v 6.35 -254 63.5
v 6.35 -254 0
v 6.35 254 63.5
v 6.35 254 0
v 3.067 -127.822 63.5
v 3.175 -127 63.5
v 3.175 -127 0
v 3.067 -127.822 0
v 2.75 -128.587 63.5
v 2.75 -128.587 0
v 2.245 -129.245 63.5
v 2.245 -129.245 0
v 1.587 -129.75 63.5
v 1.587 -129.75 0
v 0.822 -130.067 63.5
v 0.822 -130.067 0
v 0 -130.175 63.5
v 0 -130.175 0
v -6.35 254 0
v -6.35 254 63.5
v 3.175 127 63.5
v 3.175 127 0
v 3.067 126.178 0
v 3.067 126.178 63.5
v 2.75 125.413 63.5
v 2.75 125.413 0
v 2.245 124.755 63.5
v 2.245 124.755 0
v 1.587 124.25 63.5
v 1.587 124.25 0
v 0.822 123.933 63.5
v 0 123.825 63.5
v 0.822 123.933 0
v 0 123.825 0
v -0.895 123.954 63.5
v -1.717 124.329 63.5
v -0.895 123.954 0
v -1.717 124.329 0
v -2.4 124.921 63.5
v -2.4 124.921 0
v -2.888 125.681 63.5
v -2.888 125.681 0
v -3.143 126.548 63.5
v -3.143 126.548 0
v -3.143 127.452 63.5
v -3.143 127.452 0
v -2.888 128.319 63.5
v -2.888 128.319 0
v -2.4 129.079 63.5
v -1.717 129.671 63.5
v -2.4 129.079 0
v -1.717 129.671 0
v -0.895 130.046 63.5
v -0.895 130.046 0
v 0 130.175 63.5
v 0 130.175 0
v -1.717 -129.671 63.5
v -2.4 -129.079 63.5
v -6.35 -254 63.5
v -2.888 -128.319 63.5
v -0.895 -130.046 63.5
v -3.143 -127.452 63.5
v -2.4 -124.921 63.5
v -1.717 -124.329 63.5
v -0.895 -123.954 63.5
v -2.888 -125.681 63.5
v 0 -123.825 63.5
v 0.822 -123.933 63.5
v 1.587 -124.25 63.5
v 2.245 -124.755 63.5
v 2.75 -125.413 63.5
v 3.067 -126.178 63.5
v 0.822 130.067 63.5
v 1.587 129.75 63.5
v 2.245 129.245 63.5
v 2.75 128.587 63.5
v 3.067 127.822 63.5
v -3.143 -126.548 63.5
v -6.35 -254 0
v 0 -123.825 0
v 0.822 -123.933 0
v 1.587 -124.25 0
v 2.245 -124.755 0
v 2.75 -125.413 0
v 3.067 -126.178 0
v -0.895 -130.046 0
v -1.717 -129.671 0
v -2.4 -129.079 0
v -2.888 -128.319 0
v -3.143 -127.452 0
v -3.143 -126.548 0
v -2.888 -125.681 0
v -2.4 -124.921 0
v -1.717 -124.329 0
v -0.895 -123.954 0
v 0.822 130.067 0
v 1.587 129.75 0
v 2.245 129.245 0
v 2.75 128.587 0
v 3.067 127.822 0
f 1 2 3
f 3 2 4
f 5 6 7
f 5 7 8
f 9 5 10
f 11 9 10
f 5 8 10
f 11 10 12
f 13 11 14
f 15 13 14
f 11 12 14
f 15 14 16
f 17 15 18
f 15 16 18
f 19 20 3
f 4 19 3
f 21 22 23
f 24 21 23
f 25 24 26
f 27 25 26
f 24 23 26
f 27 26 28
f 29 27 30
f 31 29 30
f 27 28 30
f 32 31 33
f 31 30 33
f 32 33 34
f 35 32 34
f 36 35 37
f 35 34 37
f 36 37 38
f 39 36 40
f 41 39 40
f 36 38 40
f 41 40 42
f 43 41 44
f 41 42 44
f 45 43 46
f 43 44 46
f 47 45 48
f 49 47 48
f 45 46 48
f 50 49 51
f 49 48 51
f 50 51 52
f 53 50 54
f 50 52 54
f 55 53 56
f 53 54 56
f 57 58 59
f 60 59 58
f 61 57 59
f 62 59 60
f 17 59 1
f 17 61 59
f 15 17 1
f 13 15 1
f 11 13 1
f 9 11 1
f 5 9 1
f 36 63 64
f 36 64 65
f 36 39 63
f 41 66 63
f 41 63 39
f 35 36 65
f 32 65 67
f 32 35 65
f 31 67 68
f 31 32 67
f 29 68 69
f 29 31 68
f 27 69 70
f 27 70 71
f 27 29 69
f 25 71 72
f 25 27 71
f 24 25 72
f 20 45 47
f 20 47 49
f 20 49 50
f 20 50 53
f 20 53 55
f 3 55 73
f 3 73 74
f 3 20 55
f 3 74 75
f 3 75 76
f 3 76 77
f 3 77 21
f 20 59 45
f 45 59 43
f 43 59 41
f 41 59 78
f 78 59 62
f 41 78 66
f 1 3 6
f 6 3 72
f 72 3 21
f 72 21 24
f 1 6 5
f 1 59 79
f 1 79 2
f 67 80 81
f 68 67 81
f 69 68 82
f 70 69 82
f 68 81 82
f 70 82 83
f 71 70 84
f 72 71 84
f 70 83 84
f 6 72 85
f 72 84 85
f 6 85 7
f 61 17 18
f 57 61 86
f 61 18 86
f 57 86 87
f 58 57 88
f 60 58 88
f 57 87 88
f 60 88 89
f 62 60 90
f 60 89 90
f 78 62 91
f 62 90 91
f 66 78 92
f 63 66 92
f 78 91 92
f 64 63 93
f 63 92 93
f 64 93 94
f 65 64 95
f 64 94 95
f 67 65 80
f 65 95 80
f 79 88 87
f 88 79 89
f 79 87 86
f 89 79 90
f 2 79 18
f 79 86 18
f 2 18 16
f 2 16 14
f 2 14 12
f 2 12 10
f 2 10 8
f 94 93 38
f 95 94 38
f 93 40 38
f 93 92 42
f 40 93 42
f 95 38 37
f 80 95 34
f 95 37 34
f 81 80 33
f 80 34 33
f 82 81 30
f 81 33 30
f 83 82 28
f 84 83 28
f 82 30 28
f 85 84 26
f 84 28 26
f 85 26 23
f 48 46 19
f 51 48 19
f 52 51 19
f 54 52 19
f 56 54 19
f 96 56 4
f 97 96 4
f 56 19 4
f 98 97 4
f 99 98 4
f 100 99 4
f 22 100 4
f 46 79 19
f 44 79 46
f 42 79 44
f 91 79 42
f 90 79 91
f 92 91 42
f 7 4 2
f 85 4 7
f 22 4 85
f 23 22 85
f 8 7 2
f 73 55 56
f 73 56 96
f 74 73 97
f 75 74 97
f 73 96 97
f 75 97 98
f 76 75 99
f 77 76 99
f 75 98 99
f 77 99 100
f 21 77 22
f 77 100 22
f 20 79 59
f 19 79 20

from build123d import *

# Parameters (mm, degrees)
F0_W     = 12.7
F0_H     = 508
F1_DEPTH = 63.5
F3_DEPTH = 63.5


with BuildPart() as f1:
    # F0 (on Top) → F1 (new body)
    with BuildSketch(Plane.XY):
        Rectangle(F0_W, F0_H)
    extrude(amount=F1_DEPTH)

    # F2 (on face) → F3 (cut, through all)
    with BuildSketch(Plane(origin=(0, 0, 0), x_dir=(1, 0, 0), z_dir=(0, 0, -1))):
        with BuildLine():
            ThreePointArc((3.175, 127), (2.245064, 129.245064), (0, 130.175))
            Line((0, 130.175), (0, 127))
            Line((0, 127), (0, 123.825))
            ThreePointArc((0, 123.825), (2.245064, 124.754936), (3.175, 127))
        make_face()
        with BuildLine():
            ThreePointArc((3.175, -127), (2.245064, -124.754936), (0, -123.825))
            Line((0, -123.825), (0, -127))
            Line((0, -127), (0, -130.175))
            ThreePointArc((0, -130.175), (2.245064, -129.245064), (3.175, -127))
        make_face()
        with BuildLine():
            Line((0, -127), (0, -123.825))
            ThreePointArc((0, -123.825), (-3.175, -127), (0, -130.175))
            Line((0, -130.175), (0, -127))
        make_face()
        with BuildLine():
            Line((0, 127), (0, 130.175))
            ThreePointArc((0, 130.175), (-3.175, 127), (0, 123.825))
            Line((0, 123.825), (0, 127))
        make_face()
    extrude(amount=-F3_DEPTH, mode=Mode.SUBTRACT)


solid = f1.part
